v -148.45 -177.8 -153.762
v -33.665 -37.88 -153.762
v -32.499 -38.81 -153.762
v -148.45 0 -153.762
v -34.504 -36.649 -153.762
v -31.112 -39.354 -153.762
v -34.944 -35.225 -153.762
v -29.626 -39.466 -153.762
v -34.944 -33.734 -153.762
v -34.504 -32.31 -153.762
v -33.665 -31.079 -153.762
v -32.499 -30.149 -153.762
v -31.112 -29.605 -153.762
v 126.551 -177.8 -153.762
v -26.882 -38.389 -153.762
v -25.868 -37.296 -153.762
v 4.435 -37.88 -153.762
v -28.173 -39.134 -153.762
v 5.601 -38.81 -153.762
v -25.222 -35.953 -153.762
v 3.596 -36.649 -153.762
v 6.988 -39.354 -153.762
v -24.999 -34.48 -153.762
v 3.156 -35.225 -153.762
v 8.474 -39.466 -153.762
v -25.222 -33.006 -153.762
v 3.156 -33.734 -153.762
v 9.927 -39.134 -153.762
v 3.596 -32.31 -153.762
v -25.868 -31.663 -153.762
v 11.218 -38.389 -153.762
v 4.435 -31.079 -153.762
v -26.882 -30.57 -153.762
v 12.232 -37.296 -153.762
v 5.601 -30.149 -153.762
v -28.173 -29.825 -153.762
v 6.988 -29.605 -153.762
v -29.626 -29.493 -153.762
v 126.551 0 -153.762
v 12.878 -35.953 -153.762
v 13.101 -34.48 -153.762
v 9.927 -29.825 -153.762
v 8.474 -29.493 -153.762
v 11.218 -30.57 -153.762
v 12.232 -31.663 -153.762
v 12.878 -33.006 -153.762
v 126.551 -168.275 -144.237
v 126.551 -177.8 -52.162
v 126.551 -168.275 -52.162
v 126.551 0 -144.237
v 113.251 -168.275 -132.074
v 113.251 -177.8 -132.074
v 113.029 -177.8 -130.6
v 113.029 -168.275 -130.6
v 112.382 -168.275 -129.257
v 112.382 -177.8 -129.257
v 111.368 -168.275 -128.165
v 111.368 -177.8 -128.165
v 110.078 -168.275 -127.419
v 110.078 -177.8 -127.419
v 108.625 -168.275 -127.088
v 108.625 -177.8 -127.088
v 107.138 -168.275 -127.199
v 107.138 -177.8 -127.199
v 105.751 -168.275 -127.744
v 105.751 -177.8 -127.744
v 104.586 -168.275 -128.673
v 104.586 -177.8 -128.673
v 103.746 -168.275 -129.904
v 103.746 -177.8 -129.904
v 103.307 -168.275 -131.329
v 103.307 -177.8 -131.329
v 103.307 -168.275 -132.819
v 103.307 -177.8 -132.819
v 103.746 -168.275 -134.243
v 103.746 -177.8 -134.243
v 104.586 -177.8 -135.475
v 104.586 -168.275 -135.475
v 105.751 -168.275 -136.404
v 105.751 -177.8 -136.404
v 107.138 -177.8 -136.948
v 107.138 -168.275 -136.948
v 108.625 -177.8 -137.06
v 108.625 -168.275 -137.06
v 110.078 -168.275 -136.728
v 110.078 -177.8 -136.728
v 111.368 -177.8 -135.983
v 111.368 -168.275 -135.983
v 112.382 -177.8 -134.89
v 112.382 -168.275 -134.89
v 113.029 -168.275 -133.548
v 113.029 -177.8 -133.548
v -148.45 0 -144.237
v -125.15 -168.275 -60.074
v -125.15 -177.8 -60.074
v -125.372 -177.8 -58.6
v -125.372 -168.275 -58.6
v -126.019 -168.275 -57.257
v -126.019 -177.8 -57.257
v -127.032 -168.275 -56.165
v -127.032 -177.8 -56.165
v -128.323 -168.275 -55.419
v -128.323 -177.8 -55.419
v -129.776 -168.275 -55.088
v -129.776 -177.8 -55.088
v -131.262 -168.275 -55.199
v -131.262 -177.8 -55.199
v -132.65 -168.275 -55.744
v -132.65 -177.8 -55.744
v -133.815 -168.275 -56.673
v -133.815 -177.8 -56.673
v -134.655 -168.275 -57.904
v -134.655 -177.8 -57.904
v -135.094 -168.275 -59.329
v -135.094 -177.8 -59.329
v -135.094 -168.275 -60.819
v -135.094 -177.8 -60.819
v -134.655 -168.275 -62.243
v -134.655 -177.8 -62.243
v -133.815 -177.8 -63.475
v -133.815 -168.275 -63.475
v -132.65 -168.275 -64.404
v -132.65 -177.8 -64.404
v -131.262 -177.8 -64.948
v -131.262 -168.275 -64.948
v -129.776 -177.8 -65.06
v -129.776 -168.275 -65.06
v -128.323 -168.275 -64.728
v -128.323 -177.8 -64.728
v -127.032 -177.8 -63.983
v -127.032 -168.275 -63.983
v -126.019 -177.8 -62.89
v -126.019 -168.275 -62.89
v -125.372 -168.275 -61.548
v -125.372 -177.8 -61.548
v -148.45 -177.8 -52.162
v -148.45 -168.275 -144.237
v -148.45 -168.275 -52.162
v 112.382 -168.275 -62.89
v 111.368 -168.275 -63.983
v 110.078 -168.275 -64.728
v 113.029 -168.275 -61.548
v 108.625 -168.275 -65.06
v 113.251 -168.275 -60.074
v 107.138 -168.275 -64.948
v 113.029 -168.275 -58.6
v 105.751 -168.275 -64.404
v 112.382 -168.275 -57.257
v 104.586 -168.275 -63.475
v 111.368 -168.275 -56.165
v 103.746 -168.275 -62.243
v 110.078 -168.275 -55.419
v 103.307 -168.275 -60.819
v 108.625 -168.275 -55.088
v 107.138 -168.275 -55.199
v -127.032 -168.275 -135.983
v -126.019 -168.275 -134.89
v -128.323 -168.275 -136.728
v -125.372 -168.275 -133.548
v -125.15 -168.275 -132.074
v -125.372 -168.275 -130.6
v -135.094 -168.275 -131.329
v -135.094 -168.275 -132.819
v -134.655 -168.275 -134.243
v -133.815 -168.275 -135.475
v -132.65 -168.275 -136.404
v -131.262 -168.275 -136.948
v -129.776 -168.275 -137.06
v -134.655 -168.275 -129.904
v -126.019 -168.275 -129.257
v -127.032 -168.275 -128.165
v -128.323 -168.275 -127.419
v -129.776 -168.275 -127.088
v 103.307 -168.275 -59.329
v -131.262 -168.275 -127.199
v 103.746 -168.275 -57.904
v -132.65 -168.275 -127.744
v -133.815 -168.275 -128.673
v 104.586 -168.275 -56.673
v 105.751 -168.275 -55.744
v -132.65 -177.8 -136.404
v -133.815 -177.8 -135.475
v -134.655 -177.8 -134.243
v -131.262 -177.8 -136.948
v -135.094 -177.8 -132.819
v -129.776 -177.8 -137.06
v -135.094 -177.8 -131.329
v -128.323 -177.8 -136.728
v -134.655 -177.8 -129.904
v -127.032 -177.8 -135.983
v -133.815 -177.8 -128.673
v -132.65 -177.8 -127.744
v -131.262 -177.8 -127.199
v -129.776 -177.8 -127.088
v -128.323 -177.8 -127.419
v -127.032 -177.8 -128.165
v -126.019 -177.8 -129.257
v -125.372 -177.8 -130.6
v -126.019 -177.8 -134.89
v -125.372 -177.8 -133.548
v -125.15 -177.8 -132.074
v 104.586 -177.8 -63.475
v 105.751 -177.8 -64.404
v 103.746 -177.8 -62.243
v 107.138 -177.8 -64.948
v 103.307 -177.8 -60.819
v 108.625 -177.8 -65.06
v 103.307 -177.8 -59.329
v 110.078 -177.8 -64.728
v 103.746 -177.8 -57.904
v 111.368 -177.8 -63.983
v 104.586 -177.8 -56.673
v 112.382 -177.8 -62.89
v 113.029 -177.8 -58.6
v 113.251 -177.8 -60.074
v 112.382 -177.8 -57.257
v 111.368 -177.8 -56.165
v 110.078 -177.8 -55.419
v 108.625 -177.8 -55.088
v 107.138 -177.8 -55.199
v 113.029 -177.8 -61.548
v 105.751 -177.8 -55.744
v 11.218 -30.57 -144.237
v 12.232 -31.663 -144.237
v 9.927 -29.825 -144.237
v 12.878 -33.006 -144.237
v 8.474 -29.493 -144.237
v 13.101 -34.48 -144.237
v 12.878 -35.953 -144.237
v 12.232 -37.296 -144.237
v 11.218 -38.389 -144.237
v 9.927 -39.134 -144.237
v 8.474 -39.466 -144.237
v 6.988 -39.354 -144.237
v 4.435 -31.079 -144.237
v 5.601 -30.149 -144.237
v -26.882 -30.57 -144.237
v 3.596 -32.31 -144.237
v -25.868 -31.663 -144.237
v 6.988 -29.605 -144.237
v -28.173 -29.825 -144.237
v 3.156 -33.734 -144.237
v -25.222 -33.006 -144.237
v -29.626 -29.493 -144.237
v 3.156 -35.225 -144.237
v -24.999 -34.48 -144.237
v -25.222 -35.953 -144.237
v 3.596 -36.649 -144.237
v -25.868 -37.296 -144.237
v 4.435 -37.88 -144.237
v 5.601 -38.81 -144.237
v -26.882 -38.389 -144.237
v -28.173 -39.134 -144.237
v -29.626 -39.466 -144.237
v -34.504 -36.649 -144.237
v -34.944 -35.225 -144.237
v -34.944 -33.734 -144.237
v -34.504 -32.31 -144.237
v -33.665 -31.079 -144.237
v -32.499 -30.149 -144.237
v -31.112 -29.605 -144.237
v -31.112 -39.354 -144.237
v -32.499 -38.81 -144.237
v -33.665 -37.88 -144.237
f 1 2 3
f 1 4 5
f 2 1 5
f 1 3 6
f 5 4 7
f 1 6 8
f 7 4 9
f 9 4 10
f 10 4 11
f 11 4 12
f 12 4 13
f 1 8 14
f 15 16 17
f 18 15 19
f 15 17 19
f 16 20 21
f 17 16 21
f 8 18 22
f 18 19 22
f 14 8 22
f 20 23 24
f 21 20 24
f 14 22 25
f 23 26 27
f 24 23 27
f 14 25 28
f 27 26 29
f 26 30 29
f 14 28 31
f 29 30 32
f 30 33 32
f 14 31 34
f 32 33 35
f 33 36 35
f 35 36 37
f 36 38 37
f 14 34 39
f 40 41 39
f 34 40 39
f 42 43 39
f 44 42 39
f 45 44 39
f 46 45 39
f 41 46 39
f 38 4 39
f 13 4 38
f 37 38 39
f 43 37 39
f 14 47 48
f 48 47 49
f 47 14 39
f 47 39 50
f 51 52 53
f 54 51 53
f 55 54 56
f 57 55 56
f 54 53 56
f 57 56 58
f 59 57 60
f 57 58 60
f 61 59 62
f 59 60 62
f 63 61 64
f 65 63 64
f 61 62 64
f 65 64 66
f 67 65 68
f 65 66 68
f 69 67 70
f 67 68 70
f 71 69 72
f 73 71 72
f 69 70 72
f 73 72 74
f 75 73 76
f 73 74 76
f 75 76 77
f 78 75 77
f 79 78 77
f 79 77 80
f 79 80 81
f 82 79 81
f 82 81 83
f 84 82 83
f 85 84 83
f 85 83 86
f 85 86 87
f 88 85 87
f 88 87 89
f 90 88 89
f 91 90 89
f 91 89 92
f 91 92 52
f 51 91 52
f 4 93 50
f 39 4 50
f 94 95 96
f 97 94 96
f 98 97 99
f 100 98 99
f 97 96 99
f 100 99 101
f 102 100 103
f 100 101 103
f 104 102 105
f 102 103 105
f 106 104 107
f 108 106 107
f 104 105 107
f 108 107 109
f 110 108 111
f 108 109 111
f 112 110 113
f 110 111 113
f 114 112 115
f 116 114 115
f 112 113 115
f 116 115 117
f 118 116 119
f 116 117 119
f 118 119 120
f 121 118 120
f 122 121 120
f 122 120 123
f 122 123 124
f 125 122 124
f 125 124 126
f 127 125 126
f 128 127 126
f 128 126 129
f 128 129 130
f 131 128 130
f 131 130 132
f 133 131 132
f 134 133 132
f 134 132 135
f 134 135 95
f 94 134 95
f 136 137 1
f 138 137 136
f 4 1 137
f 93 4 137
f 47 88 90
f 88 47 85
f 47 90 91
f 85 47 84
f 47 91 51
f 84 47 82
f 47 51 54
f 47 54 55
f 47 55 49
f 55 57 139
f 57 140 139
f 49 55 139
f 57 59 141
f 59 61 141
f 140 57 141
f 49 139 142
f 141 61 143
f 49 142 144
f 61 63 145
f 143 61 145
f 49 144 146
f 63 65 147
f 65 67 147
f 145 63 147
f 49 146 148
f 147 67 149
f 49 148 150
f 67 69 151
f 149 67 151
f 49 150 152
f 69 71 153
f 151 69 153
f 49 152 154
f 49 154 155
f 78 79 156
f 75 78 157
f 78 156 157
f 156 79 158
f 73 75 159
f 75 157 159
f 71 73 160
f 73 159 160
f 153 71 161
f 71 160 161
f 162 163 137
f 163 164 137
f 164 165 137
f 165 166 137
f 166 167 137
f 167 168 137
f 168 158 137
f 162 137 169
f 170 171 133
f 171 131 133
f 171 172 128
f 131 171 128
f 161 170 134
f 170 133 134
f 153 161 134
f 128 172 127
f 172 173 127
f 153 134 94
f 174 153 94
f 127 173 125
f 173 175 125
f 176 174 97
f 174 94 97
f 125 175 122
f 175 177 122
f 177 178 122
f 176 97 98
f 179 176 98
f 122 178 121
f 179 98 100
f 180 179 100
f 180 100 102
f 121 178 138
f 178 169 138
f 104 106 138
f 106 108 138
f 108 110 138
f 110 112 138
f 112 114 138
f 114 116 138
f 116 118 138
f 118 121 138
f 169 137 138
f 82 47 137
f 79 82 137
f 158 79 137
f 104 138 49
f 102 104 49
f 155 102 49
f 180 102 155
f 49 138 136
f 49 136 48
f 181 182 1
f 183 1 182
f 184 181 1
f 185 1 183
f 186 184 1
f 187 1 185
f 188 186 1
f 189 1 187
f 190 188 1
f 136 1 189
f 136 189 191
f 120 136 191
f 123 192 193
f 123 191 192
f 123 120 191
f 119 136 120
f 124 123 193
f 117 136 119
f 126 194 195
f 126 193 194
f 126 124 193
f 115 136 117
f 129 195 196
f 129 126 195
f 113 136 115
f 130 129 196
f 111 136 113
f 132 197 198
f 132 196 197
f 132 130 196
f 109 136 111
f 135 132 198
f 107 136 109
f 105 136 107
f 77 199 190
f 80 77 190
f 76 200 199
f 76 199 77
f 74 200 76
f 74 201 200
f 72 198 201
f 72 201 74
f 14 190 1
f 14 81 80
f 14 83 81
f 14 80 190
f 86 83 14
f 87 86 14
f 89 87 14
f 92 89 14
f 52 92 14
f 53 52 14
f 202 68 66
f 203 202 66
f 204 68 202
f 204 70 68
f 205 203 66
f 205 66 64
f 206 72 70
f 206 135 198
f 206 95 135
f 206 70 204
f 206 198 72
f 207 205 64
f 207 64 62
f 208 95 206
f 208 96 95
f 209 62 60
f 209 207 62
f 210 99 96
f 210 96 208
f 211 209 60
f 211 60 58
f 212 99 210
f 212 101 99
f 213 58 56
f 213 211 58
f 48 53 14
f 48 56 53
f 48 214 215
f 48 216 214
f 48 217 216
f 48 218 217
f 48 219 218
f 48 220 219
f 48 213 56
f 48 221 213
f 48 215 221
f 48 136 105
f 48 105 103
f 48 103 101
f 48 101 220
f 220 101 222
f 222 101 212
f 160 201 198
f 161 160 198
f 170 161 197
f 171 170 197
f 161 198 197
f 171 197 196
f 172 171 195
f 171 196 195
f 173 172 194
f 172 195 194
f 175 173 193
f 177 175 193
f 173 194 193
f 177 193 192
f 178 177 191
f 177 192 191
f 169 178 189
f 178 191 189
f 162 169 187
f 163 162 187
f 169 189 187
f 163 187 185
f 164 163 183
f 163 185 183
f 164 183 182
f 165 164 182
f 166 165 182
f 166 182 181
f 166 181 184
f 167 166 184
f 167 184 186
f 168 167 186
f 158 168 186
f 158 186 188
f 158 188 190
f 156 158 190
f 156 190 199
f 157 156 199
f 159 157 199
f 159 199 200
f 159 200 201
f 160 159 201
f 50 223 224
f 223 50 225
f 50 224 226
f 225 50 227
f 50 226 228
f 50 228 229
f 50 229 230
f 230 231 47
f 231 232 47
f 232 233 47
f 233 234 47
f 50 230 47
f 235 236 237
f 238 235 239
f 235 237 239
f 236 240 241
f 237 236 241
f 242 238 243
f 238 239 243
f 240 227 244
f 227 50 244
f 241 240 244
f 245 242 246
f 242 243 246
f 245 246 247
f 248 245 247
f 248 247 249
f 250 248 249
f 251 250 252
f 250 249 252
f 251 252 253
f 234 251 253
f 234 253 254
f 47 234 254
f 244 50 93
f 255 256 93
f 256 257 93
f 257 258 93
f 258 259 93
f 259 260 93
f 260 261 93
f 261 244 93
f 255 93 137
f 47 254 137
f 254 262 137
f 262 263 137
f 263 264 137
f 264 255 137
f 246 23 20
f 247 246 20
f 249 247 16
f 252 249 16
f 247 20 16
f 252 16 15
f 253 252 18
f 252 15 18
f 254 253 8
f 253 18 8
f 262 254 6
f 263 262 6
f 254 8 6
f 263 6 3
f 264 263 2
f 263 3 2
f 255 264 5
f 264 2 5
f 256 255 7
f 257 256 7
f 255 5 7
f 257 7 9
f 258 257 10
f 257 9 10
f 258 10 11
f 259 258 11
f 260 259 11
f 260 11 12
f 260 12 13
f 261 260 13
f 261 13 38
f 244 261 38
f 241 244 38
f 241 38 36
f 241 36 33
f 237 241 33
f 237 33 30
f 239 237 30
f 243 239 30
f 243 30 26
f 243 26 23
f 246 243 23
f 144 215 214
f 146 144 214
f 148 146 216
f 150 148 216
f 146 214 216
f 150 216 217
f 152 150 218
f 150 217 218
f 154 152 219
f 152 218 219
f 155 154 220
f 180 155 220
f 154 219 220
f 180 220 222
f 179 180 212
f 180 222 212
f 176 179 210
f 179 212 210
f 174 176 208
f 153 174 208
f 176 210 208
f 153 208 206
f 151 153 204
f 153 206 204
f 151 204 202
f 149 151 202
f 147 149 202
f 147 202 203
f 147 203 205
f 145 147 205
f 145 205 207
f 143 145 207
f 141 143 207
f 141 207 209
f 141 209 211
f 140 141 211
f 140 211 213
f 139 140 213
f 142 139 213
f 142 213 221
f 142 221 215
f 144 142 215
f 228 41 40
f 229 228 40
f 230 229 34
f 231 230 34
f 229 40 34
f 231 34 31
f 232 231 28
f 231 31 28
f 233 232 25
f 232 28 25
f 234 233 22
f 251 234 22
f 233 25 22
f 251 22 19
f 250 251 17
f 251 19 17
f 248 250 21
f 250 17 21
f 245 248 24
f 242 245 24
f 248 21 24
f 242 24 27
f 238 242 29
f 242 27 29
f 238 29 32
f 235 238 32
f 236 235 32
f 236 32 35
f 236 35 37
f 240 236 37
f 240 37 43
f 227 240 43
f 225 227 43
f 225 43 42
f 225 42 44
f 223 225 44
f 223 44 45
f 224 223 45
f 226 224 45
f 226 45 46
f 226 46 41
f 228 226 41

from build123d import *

# Parameters (mm, degrees)
F0_W     = 275.00072
F0_H     = 101.6
F1_DEPTH = 177.8
F2_R     = 5
F3_DEPTH = 25
F4_W     = 168.275
F4_H     = 92.075
F5_DEPTH = 275.00172
F6_R     = 5
F7_DEPTH = 25.4


with BuildPart() as f1:
    # F0 (on Front) → F1 (new body)
    with BuildSketch(Plane.XZ):
        with Locations((-10.94948, -102.961591)):
            Rectangle(F0_W, F0_H)
    extrude(amount=F1_DEPTH)

    # F2 (on face) → F3 (cut)
    with BuildSketch(Plane.XZ.offset(177.8)):
        with Locations((-130.14984, -60.073791)):
            Circle(F2_R)
        with Locations((-130.14984, -132.073791)):
            Circle(F2_R)
        with Locations((108.25088, -132.073791)):
            Circle(F2_R)
        with Locations((108.25088, -60.073791)):
            Circle(F2_R)
    extrude(amount=-F3_DEPTH, mode=Mode.SUBTRACT)

    # F4 (on face) → F5 (cut, through all)
    with BuildSketch(Plane(origin=(-148.44984, 0, 0), x_dir=(0, -1, 0), z_dir=(-1, 0, 0))):
        with Locations((84.1375, -98.199091)):
            Rectangle(F4_W, F4_H)
    extrude(amount=-F5_DEPTH, mode=Mode.SUBTRACT)

    # F6 (on face) → F7 (cut)
    with BuildSketch(Plane(origin=(0, 0, -153.761591), x_dir=(1, 0, 0), z_dir=(0, 0, -1))):
        with Locations((8.10052, 34.4795)):
            Circle(F6_R)
        with Locations((-29.99948, 34.4795)):
            Circle(F6_R)
    extrude(amount=-F7_DEPTH, mode=Mode.SUBTRACT)


solid = f1.part
